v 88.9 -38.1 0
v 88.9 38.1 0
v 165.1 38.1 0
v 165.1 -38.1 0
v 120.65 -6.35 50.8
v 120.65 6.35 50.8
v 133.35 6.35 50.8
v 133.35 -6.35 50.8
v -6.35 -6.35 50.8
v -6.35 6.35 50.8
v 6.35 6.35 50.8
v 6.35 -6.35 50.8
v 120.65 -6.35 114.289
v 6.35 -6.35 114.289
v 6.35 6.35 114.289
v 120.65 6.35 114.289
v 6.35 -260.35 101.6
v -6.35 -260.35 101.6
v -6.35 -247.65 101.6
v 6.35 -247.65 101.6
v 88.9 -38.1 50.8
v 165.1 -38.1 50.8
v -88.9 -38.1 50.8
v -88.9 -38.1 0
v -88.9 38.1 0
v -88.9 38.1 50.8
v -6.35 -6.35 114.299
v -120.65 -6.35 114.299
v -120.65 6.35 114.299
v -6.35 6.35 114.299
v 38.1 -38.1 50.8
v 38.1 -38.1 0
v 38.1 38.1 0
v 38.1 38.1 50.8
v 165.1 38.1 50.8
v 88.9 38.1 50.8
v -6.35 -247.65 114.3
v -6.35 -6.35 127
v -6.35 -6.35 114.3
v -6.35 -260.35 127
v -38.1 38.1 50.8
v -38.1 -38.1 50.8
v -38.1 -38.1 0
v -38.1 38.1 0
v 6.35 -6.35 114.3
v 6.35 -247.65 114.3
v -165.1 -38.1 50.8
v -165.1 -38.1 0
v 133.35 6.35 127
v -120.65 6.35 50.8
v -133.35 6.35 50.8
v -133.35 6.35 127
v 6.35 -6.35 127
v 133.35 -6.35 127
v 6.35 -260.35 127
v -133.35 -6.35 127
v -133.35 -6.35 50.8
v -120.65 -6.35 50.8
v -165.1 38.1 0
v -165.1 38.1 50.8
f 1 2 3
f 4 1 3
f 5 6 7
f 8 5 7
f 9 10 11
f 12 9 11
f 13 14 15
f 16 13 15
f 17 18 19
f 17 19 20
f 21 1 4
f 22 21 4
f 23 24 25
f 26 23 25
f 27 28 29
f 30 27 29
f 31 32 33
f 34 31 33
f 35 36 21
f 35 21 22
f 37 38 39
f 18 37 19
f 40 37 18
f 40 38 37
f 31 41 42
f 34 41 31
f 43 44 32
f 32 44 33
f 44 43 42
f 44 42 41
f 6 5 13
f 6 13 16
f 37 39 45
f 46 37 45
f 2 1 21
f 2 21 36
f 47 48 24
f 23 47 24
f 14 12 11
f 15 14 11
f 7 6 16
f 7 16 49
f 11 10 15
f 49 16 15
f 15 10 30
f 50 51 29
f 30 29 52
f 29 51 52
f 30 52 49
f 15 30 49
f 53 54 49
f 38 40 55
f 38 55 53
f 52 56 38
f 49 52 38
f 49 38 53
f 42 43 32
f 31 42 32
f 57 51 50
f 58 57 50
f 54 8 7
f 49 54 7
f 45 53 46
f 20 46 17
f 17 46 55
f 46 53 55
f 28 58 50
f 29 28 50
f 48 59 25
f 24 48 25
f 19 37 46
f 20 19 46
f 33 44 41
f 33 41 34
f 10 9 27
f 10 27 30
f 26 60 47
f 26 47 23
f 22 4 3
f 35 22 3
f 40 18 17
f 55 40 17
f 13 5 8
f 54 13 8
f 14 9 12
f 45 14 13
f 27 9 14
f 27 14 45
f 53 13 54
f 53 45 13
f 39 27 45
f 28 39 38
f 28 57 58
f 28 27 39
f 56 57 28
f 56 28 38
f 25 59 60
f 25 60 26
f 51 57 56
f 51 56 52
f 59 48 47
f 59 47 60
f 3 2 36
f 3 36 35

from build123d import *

# Parameters (mm, degrees)
F0_W      = 76.2
F0_H      = 76.2
F1_DEPTH  = 50.8
F3_W      = 12.7
F3_H      = 12.7
F5_DEPTH  = 76.2
F2_W      = 12.7
F2_H      = 12.7
F4_W      = 12.7
F4_H      = 12.7
F7_W      = 12.7
F7_H      = 12.7107013464
F8_DEPTH  = 114.3
F6_W      = 12.7
F6_H      = 12.7011348009
F9_W      = 12.7
F9_H      = 12.7
F10_DEPTH = 254
F11_W     = 12.7
F11_H     = 12.7
F12_DEPTH = 12.7


with BuildPart() as f1:
    # F0 (on Top) → F1 (new body)
    with BuildSketch(Plane.XY):
        with Locations((-127, 0)):
            Rectangle(F0_W, F0_H)
    extrude(amount=F1_DEPTH)


with BuildPart() as f1b:
    # F0 (on Top) → F1, piece 2 (new body)
    with BuildSketch(Plane.XY):
        Rectangle(F0_W, F0_H)
    extrude(amount=F1_DEPTH)


with BuildPart() as f1c:
    # F0 (on Top) → F1, piece 3 (new body)
    with BuildSketch(Plane.XY):
        with Locations((127, 0)):
            Rectangle(F0_W, F0_H)
    extrude(amount=F1_DEPTH)


with BuildPart() as f5:
    # F3 (on face) → F5 (new body)
    with BuildSketch(Plane.XY.offset(50.8)):
        with Locations((-127, 0)):
            Rectangle(F3_W, F3_H)
    extrude(amount=F5_DEPTH)



with BuildPart() as f5b:
    # F2 (on face) → F5, piece 2 (new body)
    with BuildSketch(Plane.XY.offset(50.8)):
        Rectangle(F2_W, F2_H)
    extrude(amount=F5_DEPTH)



with BuildPart() as f5c:
    # F4 (on face) → F5, piece 3 (new body)
    with BuildSketch(Plane.XY.offset(50.8)):
        with Locations((127, 0)):
            Rectangle(F4_W, F4_H)
    extrude(amount=F5_DEPTH)


with BuildPart() as f5b_1:
    add(f5b.part)

    add(f5c.part)  # F8 merges F5c
    # F7 (on face) → F8 (join)
    with BuildSketch(Plane.YZ.offset(6.35)):
        with Locations((0, 120.6446493268)):
            Rectangle(F7_W, F7_H)
    extrude(amount=F8_DEPTH)


with BuildPart() as f5_1:
    add(f5.part)

    add(f5b_1.part)  # F8#2 merges F5b
    # F6 (on face) → F8, piece 2 (join)
    with BuildSketch(Plane.YZ.offset(-120.65)):
        with Locations((0, 120.6494325995)):
            Rectangle(F6_W, F6_H)
    extrude(amount=F8_DEPTH)

    # F9 (on face) → F10 (join)
    with BuildSketch(Plane.XZ.offset(6.35)):
        with Locations((0, 120.65)):
            Rectangle(F9_W, F9_H)
    extrude(amount=F10_DEPTH)

    # F11 (on face) → F12 (join)
    with BuildSketch(Plane(origin=(0, 0, 114.3), x_dir=(1, 0, 0), z_dir=(0, 0, -1))):
        with Locations((0, 254)):
            Rectangle(F11_W, F11_H)
    extrude(amount=F12_DEPTH)


solid = Compound([f1.part, f1b.part, f1c.part, f5_1.part])
